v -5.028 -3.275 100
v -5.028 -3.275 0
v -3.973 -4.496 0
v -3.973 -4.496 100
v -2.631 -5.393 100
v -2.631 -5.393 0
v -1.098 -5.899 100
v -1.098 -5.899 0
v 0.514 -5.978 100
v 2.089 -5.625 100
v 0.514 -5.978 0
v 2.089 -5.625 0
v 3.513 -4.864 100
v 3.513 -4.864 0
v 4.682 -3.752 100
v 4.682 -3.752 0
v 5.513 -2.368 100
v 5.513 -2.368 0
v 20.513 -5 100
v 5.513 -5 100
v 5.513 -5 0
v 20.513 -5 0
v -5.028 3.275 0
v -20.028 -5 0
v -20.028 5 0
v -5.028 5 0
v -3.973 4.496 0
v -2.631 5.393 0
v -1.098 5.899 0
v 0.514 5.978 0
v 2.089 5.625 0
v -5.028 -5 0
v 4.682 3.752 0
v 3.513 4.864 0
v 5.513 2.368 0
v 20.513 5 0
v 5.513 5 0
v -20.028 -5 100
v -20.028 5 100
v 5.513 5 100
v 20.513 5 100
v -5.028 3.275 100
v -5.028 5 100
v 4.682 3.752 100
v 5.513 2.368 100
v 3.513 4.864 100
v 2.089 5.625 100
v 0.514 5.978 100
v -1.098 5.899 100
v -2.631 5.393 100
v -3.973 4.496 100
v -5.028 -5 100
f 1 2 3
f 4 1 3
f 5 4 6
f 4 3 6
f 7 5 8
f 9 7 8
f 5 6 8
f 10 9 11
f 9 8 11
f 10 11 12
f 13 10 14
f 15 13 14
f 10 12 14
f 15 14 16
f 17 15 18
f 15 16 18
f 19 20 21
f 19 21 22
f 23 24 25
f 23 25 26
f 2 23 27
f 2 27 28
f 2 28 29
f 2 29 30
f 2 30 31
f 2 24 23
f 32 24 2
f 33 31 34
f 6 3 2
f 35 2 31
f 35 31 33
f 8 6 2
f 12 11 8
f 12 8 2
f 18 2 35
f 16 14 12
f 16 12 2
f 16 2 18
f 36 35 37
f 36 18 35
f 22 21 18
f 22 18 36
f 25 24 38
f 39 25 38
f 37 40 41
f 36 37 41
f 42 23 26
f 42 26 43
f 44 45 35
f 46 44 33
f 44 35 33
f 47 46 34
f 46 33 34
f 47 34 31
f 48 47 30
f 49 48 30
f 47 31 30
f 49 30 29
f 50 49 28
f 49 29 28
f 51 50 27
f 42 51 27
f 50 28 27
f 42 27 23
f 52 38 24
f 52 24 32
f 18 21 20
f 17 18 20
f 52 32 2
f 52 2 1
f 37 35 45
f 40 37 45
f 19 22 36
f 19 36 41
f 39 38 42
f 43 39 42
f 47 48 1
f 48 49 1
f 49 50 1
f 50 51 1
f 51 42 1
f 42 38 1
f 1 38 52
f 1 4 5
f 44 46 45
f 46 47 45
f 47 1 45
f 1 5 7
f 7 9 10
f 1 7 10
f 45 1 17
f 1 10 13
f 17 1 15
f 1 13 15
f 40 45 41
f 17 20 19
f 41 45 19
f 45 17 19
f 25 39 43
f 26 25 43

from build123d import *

# Parameters (mm, degrees)
F0_R     = 6
F1_DEPTH = 100
F2_W     = 15
F2_H     = 100
F3_DEPTH = 5
F4_W     = 15
F4_H     = 100
F5_DEPTH = 5


with BuildPart() as f1:
    # F0 (on Top) → F1 (new body)
    with BuildSketch(Plane.XY):
        Circle(F0_R)
    extrude(amount=F1_DEPTH)

    # F2 (on Front) → F3 (join, symmetric)
    with BuildSketch(Plane.XZ):
        with Locations((-12.527533, 50)):
            Rectangle(F2_W, F2_H)
    extrude(amount=F3_DEPTH, both=True)

    # F4 (on Front) → F5 (join, symmetric)
    with BuildSketch(Plane.XZ):
        with Locations((13.012821, 50)):
            Rectangle(F4_W, F4_H)
    extrude(amount=F5_DEPTH, both=True)


solid = f1.part
